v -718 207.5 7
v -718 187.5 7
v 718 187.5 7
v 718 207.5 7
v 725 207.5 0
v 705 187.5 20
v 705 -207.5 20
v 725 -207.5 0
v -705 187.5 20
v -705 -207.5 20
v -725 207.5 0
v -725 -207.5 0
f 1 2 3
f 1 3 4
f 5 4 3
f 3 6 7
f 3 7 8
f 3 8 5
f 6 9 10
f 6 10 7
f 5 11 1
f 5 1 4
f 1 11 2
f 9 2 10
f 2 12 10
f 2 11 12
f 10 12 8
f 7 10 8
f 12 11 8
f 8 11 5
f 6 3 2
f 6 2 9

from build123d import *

# Parameters (mm, degrees)
F0_W     = 1450
F0_H     = 415
F1_DEPTH = 20
F2_W     = 20
F2_H     = 13
F3_DEPTH = 1450
F5_DEPTH = 510


with BuildPart() as f1:
    # F0 (on Top) → F1 (new body)
    with BuildSketch(Plane.XY):
        Rectangle(F0_W, F0_H)
    extrude(amount=F1_DEPTH)

    # F2 (on face) → F3 (cut)
    with BuildSketch(Plane.YZ.offset(725)):
        with Locations((197.5, 13.5)):
            Rectangle(F2_W, F2_H)
    extrude(amount=-F3_DEPTH, mode=Mode.SUBTRACT)

    # F4 (on face) → F5 (cut)
    with BuildSketch(Plane.XZ.offset(207.5)):
        Polygon((725, 0), (725, 20), (705, 20), align=None)
        Polygon((-725, 20), (-725, 0), (-705, 20), align=None)
    extrude(amount=-F5_DEPTH, mode=Mode.SUBTRACT)


solid = f1.part
